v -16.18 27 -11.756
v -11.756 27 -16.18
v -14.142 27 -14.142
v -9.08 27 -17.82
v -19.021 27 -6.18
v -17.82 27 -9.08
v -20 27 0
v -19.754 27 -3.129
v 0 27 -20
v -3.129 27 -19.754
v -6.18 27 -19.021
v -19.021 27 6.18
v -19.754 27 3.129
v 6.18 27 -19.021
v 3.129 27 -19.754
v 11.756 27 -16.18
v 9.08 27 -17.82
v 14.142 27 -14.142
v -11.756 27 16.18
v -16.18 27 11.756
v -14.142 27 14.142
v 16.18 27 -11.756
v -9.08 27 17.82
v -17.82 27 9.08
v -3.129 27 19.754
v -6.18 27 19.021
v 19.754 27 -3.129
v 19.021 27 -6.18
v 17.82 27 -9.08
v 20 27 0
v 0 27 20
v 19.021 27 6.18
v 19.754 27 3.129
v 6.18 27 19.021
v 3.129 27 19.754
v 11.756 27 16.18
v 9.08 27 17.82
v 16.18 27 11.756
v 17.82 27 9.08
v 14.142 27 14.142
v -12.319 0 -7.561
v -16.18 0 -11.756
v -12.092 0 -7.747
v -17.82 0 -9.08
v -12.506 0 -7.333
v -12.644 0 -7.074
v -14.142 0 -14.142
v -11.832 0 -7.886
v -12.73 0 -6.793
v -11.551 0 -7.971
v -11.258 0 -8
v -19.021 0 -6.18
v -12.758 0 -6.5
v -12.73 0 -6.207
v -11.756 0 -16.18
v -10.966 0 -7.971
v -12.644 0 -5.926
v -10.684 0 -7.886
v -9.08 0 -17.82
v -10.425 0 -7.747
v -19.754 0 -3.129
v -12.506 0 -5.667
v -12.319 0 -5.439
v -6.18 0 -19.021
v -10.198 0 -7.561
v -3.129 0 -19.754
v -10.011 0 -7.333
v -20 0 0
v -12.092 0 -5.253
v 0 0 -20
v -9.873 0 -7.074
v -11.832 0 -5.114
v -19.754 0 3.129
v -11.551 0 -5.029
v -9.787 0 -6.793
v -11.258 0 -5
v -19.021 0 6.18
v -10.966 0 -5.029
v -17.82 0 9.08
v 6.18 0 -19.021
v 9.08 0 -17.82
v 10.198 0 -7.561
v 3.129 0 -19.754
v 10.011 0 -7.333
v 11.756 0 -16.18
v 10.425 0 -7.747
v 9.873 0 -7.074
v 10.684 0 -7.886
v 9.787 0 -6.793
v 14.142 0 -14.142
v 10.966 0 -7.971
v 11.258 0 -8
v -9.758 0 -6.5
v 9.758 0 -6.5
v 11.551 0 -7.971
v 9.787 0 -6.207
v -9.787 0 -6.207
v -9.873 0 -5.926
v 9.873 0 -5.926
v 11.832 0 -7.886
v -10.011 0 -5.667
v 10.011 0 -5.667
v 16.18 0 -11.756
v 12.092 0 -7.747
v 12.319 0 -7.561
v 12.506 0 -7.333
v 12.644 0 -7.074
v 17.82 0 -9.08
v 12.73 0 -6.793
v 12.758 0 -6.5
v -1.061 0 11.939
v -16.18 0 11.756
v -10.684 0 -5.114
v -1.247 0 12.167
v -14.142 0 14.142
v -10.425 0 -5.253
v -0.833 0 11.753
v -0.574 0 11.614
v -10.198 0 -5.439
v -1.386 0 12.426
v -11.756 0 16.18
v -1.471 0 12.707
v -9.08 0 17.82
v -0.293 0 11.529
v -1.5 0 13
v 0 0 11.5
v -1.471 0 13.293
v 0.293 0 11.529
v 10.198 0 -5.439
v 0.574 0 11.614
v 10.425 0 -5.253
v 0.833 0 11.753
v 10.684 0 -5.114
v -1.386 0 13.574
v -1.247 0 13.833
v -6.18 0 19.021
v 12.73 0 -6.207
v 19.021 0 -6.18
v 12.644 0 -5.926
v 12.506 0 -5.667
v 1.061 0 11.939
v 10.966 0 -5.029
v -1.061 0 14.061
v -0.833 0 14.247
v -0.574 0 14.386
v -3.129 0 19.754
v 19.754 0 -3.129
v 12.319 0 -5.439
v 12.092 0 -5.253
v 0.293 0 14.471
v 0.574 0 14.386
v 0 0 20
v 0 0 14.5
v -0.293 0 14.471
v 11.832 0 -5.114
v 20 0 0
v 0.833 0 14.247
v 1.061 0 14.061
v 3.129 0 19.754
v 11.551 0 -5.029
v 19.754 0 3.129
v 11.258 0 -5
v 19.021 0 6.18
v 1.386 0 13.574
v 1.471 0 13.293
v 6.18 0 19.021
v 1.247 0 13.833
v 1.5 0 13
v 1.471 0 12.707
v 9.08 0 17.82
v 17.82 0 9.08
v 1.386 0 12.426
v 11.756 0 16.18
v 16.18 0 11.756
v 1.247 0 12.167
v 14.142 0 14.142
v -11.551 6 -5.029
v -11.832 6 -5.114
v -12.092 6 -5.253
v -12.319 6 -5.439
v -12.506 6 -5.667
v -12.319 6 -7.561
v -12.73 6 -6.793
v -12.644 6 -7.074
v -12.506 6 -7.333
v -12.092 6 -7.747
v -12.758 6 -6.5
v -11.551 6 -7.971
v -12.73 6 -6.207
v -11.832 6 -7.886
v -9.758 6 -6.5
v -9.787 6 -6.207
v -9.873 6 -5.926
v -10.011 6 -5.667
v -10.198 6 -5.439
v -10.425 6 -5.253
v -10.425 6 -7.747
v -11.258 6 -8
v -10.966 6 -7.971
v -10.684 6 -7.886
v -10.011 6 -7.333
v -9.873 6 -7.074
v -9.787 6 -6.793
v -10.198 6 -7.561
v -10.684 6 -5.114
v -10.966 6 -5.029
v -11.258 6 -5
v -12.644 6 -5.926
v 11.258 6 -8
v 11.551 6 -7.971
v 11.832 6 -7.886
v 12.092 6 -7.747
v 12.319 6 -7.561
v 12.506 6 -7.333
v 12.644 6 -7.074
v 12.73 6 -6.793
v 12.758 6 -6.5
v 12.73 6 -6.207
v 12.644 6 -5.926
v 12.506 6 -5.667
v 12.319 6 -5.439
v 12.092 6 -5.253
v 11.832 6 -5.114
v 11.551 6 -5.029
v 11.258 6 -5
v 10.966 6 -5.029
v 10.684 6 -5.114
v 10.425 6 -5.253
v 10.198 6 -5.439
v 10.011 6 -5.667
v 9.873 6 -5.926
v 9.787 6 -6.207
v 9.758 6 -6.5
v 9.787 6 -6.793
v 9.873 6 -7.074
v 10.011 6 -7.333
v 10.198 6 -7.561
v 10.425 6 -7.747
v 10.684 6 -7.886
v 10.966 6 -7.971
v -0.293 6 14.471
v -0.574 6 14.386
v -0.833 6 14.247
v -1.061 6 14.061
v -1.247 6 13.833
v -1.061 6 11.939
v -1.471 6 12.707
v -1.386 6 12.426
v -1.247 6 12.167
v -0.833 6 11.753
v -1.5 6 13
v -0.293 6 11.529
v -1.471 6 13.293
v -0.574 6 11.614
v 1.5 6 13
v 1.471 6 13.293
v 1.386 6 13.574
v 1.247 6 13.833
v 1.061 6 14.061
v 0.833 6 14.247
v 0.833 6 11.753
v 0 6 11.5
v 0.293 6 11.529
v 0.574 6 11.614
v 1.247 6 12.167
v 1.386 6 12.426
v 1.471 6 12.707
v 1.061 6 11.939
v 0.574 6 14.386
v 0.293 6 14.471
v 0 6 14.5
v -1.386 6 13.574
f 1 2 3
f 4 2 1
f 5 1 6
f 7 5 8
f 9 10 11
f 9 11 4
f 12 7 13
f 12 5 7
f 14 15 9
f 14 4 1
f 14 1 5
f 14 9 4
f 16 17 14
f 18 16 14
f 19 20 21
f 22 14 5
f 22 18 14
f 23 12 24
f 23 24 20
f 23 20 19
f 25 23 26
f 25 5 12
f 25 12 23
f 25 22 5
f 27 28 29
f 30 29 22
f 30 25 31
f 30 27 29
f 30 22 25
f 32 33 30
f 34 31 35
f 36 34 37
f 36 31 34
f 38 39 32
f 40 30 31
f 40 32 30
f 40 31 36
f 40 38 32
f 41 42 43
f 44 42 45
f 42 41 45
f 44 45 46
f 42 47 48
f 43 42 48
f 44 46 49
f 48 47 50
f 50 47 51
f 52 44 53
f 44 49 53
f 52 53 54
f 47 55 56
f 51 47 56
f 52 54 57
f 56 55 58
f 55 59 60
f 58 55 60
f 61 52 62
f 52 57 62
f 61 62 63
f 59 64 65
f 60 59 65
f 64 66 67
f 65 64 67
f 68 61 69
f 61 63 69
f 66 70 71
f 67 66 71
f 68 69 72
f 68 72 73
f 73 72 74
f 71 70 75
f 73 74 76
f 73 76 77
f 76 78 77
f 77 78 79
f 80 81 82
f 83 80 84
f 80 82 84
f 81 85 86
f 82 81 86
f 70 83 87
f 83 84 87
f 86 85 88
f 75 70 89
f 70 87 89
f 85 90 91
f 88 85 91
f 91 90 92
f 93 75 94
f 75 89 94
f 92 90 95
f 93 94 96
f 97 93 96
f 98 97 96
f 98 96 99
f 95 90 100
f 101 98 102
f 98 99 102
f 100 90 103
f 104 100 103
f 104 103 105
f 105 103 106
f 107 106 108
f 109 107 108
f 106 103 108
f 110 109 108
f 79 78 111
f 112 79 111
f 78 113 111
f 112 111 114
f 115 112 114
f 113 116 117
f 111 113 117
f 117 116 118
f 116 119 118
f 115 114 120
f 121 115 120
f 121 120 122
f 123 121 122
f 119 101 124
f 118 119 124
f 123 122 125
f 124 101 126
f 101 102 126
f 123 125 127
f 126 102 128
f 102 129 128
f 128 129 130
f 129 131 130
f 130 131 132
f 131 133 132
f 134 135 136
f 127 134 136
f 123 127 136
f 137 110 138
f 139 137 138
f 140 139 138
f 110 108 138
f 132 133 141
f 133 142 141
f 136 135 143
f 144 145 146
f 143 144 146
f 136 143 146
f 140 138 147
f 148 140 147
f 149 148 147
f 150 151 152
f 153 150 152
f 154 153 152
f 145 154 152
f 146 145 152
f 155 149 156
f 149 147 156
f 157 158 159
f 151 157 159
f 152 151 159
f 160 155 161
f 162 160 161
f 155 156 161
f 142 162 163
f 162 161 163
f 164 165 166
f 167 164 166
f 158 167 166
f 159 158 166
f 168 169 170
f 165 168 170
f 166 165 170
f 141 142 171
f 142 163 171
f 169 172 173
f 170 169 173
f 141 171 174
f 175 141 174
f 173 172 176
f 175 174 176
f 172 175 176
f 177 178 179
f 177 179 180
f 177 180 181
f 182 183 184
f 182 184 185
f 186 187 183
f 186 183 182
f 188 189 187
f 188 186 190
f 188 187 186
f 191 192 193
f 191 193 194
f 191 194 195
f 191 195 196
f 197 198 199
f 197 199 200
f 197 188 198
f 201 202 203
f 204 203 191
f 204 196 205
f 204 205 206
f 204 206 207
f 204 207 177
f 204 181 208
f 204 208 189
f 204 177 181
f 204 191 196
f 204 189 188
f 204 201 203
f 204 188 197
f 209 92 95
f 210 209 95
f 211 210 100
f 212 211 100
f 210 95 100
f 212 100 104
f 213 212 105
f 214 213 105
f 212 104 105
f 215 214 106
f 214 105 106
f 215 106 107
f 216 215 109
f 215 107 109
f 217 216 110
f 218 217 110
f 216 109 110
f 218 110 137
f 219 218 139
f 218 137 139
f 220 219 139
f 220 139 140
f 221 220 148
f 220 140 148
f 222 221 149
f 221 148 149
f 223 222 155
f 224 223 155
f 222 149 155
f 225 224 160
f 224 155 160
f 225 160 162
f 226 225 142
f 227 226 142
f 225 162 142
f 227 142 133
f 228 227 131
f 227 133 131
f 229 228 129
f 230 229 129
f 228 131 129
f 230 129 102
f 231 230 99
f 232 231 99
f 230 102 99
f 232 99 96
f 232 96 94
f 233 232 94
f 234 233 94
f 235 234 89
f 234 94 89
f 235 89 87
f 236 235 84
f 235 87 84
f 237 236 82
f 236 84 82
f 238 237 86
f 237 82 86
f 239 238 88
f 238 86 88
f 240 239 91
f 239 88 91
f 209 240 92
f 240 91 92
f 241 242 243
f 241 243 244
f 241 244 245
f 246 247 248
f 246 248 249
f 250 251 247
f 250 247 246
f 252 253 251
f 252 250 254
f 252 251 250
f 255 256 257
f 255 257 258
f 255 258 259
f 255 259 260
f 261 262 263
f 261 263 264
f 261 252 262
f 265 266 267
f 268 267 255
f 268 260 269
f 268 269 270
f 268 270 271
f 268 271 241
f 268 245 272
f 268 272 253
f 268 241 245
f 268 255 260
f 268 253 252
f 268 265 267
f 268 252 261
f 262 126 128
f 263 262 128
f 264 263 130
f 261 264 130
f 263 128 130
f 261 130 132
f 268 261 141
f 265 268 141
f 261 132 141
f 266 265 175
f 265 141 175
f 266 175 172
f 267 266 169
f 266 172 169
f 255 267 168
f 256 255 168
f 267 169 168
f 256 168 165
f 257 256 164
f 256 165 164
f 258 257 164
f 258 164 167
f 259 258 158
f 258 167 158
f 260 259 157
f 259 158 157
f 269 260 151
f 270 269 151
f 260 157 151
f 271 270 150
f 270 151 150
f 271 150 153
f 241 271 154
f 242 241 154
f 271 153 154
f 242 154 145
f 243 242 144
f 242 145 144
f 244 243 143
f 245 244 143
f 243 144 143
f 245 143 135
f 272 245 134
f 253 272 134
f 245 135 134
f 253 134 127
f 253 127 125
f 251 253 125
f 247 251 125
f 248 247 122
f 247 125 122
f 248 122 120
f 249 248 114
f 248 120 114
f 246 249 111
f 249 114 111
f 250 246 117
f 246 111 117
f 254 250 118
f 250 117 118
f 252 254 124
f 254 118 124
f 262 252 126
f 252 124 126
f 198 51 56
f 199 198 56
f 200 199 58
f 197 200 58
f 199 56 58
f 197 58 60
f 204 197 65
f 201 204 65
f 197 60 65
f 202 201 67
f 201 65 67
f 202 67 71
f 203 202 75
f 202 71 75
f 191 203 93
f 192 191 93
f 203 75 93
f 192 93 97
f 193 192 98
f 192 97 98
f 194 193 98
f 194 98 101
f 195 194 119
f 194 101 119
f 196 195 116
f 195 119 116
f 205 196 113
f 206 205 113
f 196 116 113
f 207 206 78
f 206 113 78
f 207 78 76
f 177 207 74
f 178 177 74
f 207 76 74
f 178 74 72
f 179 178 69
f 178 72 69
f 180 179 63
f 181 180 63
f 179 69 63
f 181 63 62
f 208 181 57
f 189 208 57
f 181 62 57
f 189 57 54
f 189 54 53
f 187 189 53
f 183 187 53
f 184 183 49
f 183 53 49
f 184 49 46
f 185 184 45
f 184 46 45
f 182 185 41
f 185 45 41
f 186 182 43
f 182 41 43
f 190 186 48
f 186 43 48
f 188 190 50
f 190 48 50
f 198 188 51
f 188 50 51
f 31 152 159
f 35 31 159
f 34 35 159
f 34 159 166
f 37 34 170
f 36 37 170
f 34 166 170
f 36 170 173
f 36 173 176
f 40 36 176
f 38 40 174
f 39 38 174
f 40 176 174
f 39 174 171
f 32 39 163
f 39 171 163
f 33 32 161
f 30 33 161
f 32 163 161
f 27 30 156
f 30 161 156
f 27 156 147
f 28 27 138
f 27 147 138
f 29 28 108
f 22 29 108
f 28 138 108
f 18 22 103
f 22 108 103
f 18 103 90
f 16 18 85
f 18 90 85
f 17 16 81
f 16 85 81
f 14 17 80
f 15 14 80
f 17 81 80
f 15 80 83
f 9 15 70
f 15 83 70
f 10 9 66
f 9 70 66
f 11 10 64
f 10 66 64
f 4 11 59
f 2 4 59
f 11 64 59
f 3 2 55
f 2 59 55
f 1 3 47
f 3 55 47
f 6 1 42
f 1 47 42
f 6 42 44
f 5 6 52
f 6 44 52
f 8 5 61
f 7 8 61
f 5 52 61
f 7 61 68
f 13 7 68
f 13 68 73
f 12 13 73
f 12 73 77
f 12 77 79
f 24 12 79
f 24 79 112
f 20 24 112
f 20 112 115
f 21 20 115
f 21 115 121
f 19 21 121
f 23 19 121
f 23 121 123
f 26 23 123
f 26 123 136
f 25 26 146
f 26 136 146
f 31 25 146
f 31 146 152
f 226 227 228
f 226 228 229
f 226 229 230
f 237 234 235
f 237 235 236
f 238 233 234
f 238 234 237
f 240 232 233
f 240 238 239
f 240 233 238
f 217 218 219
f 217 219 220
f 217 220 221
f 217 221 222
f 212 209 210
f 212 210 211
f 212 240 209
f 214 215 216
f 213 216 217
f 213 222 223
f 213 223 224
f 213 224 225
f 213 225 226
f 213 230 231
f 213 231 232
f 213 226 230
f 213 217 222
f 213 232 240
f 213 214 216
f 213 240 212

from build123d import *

# Parameters (mm, degrees)
SKETCH1_R           = 20
BOSS_EXTRUDE1_DEPTH = 27
SKETCH2_R           = 1.5
CUT_EXTRUDE1_DEPTH  = 6


with BuildPart() as part:
    # Sketch1 → Boss-Extrude1 (new body)
    with BuildSketch(Plane(origin=(0, 0, 0), x_dir=(1, 0, 0), z_dir=(0, 1, 0))):
        with Locations(Location((0, 0, 0), (0, 0, 270))):
            Circle(SKETCH1_R)
    extrude(amount=BOSS_EXTRUDE1_DEPTH)

    # Sketch2 → Cut-Extrude1 (cut)
    with BuildSketch(Plane.XZ):
        with Locations(Location((0, 13, 0), (0, 0, 270))):
            Circle(SKETCH2_R)
        with Locations(Location((11.258330249, -6.5, 0), (0, 0, 270))):
            Circle(SKETCH2_R)
        with Locations(Location((-11.258330249, -6.5, 0), (0, 0, 270))):
            Circle(SKETCH2_R)
    extrude(amount=-CUT_EXTRUDE1_DEPTH, mode=Mode.SUBTRACT)


solid = part.part
